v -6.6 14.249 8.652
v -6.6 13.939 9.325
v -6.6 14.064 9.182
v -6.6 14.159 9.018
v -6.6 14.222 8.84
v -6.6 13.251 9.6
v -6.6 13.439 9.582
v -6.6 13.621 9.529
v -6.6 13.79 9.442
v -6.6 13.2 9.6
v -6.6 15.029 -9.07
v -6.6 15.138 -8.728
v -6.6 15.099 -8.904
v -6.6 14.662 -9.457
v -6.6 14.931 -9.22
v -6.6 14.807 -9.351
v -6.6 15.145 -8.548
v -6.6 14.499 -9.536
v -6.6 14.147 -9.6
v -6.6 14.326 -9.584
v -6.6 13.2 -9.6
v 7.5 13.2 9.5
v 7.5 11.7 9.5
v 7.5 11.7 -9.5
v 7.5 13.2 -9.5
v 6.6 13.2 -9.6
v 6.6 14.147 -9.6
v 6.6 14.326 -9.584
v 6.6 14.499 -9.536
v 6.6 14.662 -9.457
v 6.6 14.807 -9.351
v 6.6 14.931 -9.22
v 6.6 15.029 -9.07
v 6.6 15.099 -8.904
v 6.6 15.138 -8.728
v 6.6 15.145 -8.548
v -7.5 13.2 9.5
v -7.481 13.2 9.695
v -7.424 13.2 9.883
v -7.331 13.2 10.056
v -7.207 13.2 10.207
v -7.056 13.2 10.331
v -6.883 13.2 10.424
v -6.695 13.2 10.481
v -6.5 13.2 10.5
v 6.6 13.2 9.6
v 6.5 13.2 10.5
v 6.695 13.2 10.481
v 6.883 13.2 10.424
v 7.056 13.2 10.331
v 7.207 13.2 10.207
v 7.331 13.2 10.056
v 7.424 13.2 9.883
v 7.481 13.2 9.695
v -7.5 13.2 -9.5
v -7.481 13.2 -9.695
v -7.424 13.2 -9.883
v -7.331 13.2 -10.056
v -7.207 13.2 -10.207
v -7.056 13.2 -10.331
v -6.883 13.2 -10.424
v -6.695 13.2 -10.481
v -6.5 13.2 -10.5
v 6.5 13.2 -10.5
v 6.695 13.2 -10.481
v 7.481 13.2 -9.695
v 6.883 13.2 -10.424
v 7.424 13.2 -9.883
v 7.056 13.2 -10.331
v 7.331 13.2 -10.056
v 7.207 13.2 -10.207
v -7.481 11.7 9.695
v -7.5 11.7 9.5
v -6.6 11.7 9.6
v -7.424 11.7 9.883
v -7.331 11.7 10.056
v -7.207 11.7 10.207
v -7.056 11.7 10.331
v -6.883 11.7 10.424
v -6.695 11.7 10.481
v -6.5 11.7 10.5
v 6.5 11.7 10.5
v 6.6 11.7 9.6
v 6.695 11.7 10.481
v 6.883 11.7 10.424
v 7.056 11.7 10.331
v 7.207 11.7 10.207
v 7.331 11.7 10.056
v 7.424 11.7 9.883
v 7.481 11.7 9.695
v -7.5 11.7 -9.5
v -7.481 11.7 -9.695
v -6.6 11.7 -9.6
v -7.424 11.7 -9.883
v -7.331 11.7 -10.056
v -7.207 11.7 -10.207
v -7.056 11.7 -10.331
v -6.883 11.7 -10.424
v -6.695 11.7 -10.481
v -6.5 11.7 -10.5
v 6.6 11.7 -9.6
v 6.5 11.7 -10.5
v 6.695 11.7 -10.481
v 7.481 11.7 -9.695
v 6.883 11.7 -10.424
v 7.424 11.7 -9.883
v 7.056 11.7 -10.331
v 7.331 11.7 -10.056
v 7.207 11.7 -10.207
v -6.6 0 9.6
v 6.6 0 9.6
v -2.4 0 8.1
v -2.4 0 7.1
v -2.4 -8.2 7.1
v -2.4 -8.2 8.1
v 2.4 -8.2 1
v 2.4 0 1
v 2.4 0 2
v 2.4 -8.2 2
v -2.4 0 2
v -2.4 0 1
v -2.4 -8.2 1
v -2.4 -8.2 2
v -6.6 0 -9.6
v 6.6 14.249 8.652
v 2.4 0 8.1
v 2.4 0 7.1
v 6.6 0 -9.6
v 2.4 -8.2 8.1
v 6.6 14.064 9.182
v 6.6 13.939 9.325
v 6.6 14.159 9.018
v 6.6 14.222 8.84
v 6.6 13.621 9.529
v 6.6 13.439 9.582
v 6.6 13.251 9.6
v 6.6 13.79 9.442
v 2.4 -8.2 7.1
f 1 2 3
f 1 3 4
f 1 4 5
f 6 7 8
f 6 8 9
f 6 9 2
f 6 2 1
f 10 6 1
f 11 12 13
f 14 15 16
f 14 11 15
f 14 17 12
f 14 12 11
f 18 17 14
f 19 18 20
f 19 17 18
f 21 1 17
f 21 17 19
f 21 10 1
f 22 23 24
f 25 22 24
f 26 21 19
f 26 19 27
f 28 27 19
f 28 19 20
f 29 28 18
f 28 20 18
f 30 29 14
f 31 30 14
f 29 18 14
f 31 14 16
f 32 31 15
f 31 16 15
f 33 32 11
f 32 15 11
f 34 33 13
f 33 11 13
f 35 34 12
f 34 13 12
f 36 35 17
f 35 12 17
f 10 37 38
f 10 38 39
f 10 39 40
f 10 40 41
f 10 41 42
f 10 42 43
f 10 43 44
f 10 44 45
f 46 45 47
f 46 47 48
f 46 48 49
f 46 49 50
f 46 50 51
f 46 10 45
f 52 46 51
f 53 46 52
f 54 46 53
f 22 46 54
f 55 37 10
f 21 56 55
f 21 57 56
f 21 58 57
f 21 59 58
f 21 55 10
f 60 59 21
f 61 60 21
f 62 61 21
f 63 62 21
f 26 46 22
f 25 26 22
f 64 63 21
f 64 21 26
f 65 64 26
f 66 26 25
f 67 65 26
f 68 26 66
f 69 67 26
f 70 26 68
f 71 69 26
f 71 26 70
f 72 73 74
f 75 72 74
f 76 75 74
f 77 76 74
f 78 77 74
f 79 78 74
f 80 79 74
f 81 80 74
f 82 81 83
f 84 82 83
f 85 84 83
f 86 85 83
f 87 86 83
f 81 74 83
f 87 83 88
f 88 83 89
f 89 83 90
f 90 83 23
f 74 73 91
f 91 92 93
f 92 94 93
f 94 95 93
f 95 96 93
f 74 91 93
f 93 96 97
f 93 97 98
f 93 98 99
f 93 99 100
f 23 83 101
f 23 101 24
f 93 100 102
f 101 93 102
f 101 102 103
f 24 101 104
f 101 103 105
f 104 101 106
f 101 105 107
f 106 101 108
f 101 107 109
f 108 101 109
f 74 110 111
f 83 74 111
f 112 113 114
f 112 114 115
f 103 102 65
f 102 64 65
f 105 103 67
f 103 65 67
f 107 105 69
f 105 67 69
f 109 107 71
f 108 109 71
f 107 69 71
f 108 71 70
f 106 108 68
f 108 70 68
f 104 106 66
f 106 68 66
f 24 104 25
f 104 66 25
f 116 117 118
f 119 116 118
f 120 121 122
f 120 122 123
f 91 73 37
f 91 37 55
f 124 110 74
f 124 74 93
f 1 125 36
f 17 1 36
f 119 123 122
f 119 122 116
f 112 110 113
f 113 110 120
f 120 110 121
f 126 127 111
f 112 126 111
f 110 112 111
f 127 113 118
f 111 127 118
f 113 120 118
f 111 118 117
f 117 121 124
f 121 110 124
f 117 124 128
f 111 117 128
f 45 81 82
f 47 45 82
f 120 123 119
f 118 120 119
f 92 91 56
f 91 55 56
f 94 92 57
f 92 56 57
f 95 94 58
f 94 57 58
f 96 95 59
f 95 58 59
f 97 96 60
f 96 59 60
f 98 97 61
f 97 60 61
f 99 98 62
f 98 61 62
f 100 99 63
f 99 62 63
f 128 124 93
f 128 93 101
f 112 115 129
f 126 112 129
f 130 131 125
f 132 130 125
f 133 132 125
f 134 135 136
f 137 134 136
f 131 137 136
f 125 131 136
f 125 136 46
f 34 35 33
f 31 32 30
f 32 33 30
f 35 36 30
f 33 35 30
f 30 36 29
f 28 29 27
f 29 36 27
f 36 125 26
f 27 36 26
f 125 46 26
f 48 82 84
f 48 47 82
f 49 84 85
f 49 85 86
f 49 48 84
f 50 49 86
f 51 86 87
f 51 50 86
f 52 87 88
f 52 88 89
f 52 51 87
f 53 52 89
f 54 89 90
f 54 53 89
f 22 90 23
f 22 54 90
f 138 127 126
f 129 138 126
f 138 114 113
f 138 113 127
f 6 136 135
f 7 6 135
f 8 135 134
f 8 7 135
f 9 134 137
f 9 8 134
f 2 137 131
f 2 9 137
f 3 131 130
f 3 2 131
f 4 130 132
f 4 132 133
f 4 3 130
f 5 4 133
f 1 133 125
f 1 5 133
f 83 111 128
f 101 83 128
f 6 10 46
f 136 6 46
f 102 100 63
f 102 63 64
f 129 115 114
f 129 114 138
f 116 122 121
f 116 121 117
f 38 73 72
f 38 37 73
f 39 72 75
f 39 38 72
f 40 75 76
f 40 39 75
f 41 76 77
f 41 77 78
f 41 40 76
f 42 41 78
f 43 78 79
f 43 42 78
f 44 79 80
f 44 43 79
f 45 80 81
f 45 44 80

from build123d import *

# Parameters (mm, degrees)
SKETCH1_W           = 13.2
SKETCH1_H           = 19.2
BOSS_EXTRUDE1_DEPTH = 11.7
SKETCH2_W           = 15
SKETCH2_H           = 21
BOSS_EXTRUDE2_DEPTH = 1.5
SKETCH3_W           = 13.2
SKETCH3_H           = 19.2
BOSS_EXTRUDE3_DEPTH = 5
CUT_EXTRUDE1_DEPTH  = 13.2
SKETCH5_W           = 4.8
SKETCH5_H           = 1
BOSS_EXTRUDE4_DEPTH = 8.2
FILLET1_R           = 1


with BuildPart() as part:
    # Sketch1 → Boss-Extrude1 (new body)
    with BuildSketch(Plane(origin=(0, 0, 0), x_dir=(1, 0, 0), z_dir=(0, 1, 0))):
        Rectangle(SKETCH1_W, SKETCH1_H)
    extrude(amount=BOSS_EXTRUDE1_DEPTH)

    # Sketch2 → Boss-Extrude2 (add)
    with BuildSketch(Plane(origin=(0, 11.7, 0), x_dir=(1, 0, 0), z_dir=(0, 1, 0))):
        Rectangle(SKETCH2_W, SKETCH2_H)
    extrude(amount=BOSS_EXTRUDE2_DEPTH)

    # Sketch3 → Boss-Extrude3 (add)
    with BuildSketch(Plane(origin=(0, 13.2, 0), x_dir=(1, 0, 0), z_dir=(0, 1, 0))):
        Rectangle(SKETCH3_W, SKETCH3_H)
    extrude(amount=BOSS_EXTRUDE3_DEPTH)

    # Sketch4 → Cut-Extrude1 (cut)
    with BuildSketch(Plane(origin=(6.6, 0, 0), x_dir=(0, 0, -1), z_dir=(1, 0, 0))):
        Polygon((-9.6, 18.2), (-9.6, 15.7), (-9.6, 14.2), (9.6, 15.2), (9.6, 18.2), align=None)
    extrude(amount=-CUT_EXTRUDE1_DEPTH, mode=Mode.SUBTRACT)

    # Sketch5 → Boss-Extrude4 (add)
    with BuildSketch(Plane.XZ):
        with Locations((0, 1.5)):
            Rectangle(SKETCH5_W, SKETCH5_H)
        with Locations((0, 7.6)):
            Rectangle(SKETCH5_W, SKETCH5_H)
    extrude(amount=BOSS_EXTRUDE4_DEPTH)

    # Fillet1
    fillet1_edges = [part.edges().sort_by_distance(p)[0] for p in [
        (7.5, 12.45, 10.5),
        (7.5, 12.45, -10.5),
        (-7.5, 12.45, -10.5),
        (-7.5, 12.45, 10.5),
        (0, 15.2, -9.6),
        (0, 14.2, 9.6),
    ]]
    fillet(fillet1_edges, radius=FILLET1_R)


solid = part.part
